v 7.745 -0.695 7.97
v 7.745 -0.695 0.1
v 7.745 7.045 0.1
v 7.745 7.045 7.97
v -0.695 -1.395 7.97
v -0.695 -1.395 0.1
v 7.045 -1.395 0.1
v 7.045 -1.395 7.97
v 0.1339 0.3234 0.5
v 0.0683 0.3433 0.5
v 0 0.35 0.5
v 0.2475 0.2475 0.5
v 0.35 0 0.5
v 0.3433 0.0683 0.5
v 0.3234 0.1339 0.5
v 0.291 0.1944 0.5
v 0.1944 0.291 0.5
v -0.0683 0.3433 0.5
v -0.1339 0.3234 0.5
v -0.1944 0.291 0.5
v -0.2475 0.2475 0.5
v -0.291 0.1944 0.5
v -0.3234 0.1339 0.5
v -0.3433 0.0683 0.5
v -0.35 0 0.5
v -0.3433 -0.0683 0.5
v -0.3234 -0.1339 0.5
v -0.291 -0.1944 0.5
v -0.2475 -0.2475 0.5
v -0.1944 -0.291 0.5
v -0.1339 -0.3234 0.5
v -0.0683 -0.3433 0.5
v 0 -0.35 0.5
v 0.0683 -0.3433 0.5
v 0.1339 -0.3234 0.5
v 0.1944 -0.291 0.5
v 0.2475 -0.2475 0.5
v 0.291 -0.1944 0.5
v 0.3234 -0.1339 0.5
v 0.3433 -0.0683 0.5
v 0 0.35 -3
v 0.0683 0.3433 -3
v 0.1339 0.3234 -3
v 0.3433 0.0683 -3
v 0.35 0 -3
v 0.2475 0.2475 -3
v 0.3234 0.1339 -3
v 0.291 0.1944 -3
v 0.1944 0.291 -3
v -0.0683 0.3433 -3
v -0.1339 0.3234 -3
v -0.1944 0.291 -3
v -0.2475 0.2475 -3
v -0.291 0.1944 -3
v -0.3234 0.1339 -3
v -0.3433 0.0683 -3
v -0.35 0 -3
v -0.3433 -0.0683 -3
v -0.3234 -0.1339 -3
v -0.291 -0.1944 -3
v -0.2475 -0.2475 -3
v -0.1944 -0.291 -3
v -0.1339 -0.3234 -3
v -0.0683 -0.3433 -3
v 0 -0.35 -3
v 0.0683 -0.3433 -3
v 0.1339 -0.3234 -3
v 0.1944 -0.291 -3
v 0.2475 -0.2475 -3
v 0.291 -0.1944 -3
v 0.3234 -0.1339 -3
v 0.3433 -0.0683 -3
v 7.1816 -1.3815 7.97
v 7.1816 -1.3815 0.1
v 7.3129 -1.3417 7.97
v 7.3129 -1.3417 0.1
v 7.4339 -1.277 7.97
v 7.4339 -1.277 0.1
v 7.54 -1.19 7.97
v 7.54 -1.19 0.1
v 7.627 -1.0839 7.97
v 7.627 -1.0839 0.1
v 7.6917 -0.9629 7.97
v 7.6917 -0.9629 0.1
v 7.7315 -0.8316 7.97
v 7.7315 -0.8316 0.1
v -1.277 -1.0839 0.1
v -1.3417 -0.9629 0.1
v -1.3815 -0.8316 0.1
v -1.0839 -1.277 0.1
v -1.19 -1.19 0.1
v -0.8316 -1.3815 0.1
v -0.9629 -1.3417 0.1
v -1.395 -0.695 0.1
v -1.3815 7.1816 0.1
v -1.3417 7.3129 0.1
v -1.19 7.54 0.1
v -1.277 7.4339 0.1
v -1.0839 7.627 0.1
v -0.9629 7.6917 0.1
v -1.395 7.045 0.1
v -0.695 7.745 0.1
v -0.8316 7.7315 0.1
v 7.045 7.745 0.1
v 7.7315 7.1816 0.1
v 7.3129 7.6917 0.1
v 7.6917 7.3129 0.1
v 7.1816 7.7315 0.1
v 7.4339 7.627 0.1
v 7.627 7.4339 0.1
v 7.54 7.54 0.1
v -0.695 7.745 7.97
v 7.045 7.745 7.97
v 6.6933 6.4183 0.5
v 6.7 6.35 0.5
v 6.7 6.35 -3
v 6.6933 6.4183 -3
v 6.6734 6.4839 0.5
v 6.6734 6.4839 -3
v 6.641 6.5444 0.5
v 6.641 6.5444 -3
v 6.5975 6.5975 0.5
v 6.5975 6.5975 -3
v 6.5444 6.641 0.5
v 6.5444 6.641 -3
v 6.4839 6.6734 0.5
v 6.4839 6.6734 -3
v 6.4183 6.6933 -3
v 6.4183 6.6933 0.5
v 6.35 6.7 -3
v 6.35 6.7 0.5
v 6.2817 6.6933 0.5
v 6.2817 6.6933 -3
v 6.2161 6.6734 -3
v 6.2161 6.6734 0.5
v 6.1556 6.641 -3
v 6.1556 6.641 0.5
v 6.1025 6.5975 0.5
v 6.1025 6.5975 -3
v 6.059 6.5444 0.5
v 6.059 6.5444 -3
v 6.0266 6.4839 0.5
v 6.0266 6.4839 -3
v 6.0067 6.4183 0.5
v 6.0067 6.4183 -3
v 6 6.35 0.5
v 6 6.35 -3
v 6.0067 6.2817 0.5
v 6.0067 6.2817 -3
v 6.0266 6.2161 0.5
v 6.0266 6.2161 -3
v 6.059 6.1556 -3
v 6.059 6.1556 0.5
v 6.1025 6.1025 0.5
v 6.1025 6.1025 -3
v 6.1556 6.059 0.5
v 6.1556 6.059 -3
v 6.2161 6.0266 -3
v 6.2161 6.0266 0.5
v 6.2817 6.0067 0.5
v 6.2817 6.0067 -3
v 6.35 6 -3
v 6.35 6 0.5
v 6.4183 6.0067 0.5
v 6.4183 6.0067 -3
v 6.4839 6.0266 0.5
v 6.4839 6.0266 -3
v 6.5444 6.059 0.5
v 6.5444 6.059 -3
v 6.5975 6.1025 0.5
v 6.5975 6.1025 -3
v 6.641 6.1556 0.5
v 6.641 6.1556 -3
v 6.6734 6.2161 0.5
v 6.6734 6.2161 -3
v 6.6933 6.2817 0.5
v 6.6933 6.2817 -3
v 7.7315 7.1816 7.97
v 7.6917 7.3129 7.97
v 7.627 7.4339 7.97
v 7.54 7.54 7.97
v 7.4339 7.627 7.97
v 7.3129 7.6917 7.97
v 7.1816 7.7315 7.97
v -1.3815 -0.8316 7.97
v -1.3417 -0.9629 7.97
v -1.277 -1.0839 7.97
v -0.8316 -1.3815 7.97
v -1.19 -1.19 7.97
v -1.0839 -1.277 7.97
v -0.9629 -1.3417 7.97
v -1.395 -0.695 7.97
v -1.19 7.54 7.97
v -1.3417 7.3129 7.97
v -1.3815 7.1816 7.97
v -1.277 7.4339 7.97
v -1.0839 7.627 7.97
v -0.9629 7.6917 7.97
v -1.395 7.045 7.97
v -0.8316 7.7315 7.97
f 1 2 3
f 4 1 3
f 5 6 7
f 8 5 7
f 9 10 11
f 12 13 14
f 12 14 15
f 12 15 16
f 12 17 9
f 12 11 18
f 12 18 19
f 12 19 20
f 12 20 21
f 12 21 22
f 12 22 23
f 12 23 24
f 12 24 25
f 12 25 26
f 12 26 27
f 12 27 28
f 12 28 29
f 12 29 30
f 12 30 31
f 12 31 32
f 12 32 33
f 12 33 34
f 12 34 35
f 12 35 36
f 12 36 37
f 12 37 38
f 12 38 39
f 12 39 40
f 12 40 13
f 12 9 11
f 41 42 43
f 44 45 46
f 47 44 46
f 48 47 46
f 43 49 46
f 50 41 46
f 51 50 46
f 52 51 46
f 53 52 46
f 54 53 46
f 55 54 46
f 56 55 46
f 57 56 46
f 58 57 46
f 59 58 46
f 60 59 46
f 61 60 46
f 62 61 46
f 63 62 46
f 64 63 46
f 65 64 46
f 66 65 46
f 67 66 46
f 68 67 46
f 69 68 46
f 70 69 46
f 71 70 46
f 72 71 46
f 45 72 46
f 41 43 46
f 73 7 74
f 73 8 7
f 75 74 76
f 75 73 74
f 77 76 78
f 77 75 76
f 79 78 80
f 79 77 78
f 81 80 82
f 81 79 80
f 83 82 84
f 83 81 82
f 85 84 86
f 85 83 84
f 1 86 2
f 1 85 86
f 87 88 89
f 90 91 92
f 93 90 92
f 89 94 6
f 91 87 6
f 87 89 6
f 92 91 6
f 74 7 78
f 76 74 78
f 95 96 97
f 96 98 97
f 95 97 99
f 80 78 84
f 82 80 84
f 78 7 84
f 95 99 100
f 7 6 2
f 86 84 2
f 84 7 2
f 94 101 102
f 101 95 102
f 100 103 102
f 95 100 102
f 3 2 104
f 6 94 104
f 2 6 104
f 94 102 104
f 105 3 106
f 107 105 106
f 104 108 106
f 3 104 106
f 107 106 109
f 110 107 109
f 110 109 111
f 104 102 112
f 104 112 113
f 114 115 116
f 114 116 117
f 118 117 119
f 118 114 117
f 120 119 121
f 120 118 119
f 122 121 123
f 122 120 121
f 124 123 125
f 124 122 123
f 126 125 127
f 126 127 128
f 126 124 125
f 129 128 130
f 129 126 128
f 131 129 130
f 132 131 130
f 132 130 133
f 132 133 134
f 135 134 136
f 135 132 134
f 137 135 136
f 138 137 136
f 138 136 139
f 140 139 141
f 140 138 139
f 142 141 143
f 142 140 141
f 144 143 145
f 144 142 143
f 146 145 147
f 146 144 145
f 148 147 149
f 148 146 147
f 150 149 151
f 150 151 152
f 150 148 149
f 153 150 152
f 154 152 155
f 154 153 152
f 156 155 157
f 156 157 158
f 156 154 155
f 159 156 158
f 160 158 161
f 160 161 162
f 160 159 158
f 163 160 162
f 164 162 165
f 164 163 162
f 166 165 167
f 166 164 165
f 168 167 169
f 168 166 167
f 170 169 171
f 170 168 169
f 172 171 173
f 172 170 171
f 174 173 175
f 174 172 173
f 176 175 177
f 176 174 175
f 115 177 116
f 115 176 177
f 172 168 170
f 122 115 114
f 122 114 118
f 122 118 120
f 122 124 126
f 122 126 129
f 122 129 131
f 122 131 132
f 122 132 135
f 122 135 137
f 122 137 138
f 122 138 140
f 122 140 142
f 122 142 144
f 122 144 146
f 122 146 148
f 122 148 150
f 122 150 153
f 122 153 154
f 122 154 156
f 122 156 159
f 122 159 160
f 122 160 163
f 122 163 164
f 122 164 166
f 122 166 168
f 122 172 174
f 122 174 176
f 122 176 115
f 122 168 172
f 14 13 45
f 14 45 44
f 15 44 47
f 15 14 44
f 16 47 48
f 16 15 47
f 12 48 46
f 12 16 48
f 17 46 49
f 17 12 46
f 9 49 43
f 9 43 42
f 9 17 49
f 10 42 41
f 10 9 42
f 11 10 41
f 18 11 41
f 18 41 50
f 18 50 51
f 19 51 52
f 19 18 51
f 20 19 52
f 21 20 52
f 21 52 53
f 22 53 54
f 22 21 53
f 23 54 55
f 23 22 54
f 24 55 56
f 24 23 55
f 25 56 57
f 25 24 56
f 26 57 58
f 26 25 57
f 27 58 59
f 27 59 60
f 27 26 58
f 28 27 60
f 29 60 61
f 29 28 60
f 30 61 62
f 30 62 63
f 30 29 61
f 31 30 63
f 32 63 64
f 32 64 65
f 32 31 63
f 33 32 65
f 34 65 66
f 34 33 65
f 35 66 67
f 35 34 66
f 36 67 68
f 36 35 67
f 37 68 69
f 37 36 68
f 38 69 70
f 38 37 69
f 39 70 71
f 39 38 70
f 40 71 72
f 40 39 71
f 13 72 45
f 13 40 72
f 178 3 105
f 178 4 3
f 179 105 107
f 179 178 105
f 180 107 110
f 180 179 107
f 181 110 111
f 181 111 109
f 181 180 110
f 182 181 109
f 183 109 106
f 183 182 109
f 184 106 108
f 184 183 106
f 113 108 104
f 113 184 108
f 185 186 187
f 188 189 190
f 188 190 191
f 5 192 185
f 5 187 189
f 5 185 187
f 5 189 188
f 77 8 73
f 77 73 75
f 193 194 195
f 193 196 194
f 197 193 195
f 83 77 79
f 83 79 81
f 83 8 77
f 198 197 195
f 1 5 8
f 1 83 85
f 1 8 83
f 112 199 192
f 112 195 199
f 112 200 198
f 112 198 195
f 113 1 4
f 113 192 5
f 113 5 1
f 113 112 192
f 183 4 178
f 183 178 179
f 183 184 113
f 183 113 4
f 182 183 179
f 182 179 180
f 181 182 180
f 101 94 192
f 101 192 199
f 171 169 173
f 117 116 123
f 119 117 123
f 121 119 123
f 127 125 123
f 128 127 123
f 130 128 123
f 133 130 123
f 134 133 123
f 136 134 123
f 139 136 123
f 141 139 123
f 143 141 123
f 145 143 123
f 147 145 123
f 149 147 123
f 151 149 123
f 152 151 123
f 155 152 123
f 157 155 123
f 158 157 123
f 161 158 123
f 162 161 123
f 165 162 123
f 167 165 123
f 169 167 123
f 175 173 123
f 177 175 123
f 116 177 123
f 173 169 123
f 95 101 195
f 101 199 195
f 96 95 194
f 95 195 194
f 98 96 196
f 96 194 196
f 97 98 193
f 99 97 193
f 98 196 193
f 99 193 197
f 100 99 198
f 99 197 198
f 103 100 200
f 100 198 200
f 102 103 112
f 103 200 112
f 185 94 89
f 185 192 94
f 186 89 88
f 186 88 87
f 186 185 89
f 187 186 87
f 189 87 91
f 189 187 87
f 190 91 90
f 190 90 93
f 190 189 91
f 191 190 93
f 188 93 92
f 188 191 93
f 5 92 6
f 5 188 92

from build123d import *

# Parameters (mm, degrees)
SKETCH001_R  = 0.35
PAD001_DEPTH = 3.5
SKETCH_W     = 9.14
SKETCH_H     = 9.14
PAD_DEPTH    = 7.87
FILLET_R     = 0.7


with BuildPart() as pad001:
    # Sketch001 → Pad001 (new body)
    with BuildSketch(Plane.XY.offset(0.5)):
        Circle(SKETCH001_R)
        with Locations((6.35, 6.35)):
            Circle(SKETCH001_R)
    extrude(amount=-PAD001_DEPTH)


with BuildPart() as fillet_body:
    # Sketch → Pad (new body)
    with BuildSketch(Plane.XY.offset(0.1)):
        with Locations((3.175, 3.175)):
            Rectangle(SKETCH_W, SKETCH_H)
    extrude(amount=PAD_DEPTH)

    # Fillet
    fillet_edges = [fillet_body.edges().sort_by_distance(p)[0] for p in [
        (7.745, -1.395, 4.035),
        (7.745, 7.745, 4.035),
        (-1.395, -1.395, 4.035),
        (-1.395, 7.745, 4.035),
    ]]
    fillet(fillet_edges, radius=FILLET_R)


solid = Compound([pad001.part, fillet_body.part])
